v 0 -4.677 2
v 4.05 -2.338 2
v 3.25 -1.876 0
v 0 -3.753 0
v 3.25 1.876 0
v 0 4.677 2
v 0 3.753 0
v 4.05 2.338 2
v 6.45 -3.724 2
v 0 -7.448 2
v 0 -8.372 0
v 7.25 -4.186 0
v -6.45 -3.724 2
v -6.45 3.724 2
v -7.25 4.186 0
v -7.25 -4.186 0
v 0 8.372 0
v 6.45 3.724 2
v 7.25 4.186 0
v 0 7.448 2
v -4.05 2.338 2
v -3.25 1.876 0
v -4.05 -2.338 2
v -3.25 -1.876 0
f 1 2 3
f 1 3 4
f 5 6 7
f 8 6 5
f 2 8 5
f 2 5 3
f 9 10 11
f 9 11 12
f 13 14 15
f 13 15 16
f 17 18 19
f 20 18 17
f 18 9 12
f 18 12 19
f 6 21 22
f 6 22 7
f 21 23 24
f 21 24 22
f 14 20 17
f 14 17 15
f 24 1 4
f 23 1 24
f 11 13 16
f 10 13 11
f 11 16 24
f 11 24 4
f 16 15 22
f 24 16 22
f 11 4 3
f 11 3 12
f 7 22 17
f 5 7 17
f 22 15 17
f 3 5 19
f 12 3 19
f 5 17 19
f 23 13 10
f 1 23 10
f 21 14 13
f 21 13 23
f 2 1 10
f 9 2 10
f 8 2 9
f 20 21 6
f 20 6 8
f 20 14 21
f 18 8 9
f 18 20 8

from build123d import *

# Parameters (mm, degrees)
F1_DEPTH = 2
F2_SIZE2 = 0.79999
F2_SIZE  = 1.99999


# Not quite as in the source:
# - a fillet or chamfer is up to 0.001 mm smaller than in the source, because OpenCascade refuses the exact size


with BuildPart() as f1:
    # F0 (on Top) → F1 (new body)
    with BuildSketch(Plane.XY):
        Polygon((-7.25, 4.1857894516), (-7.25, -4.1857894516), (0, -8.3715789032), (7.25, -4.1857894516), (7.25, 4.1857894516), (0, 8.3715789032), align=None)
        Polygon((0, 3.7527767497), (3.25, 1.8763883749), (3.25, -1.8763883749), (0, -3.7527767497), (-3.25, -1.8763883749), (-3.25, 1.8763883749), align=None, mode=Mode.SUBTRACT)
    extrude(amount=F1_DEPTH)

    # F2 (size 2 and 0.8 in the source; OpenCascade refuses exactly that, so slightly less here)
    f2_edges = [f1.edges().sort_by_distance(p)[0] for p in [
        (-7.25, 0, 2),
        (-3.625, -6.278684, 2),
        (3.625, -6.278684, 2),
        (7.25, 0, 2),
        (3.625, 6.278684, 2),
        (-3.625, 6.278684, 2),
        (-3.25, 0, 2),
        (-1.625, 2.814583, 2),
        (1.625, 2.814583, 2),
        (3.25, 0, 2),
        (1.625, -2.814583, 2),
        (-1.625, -2.814583, 2),
    ]]
    chamfer(f2_edges, length=F2_SIZE, length2=F2_SIZE2)


solid = f1.part
